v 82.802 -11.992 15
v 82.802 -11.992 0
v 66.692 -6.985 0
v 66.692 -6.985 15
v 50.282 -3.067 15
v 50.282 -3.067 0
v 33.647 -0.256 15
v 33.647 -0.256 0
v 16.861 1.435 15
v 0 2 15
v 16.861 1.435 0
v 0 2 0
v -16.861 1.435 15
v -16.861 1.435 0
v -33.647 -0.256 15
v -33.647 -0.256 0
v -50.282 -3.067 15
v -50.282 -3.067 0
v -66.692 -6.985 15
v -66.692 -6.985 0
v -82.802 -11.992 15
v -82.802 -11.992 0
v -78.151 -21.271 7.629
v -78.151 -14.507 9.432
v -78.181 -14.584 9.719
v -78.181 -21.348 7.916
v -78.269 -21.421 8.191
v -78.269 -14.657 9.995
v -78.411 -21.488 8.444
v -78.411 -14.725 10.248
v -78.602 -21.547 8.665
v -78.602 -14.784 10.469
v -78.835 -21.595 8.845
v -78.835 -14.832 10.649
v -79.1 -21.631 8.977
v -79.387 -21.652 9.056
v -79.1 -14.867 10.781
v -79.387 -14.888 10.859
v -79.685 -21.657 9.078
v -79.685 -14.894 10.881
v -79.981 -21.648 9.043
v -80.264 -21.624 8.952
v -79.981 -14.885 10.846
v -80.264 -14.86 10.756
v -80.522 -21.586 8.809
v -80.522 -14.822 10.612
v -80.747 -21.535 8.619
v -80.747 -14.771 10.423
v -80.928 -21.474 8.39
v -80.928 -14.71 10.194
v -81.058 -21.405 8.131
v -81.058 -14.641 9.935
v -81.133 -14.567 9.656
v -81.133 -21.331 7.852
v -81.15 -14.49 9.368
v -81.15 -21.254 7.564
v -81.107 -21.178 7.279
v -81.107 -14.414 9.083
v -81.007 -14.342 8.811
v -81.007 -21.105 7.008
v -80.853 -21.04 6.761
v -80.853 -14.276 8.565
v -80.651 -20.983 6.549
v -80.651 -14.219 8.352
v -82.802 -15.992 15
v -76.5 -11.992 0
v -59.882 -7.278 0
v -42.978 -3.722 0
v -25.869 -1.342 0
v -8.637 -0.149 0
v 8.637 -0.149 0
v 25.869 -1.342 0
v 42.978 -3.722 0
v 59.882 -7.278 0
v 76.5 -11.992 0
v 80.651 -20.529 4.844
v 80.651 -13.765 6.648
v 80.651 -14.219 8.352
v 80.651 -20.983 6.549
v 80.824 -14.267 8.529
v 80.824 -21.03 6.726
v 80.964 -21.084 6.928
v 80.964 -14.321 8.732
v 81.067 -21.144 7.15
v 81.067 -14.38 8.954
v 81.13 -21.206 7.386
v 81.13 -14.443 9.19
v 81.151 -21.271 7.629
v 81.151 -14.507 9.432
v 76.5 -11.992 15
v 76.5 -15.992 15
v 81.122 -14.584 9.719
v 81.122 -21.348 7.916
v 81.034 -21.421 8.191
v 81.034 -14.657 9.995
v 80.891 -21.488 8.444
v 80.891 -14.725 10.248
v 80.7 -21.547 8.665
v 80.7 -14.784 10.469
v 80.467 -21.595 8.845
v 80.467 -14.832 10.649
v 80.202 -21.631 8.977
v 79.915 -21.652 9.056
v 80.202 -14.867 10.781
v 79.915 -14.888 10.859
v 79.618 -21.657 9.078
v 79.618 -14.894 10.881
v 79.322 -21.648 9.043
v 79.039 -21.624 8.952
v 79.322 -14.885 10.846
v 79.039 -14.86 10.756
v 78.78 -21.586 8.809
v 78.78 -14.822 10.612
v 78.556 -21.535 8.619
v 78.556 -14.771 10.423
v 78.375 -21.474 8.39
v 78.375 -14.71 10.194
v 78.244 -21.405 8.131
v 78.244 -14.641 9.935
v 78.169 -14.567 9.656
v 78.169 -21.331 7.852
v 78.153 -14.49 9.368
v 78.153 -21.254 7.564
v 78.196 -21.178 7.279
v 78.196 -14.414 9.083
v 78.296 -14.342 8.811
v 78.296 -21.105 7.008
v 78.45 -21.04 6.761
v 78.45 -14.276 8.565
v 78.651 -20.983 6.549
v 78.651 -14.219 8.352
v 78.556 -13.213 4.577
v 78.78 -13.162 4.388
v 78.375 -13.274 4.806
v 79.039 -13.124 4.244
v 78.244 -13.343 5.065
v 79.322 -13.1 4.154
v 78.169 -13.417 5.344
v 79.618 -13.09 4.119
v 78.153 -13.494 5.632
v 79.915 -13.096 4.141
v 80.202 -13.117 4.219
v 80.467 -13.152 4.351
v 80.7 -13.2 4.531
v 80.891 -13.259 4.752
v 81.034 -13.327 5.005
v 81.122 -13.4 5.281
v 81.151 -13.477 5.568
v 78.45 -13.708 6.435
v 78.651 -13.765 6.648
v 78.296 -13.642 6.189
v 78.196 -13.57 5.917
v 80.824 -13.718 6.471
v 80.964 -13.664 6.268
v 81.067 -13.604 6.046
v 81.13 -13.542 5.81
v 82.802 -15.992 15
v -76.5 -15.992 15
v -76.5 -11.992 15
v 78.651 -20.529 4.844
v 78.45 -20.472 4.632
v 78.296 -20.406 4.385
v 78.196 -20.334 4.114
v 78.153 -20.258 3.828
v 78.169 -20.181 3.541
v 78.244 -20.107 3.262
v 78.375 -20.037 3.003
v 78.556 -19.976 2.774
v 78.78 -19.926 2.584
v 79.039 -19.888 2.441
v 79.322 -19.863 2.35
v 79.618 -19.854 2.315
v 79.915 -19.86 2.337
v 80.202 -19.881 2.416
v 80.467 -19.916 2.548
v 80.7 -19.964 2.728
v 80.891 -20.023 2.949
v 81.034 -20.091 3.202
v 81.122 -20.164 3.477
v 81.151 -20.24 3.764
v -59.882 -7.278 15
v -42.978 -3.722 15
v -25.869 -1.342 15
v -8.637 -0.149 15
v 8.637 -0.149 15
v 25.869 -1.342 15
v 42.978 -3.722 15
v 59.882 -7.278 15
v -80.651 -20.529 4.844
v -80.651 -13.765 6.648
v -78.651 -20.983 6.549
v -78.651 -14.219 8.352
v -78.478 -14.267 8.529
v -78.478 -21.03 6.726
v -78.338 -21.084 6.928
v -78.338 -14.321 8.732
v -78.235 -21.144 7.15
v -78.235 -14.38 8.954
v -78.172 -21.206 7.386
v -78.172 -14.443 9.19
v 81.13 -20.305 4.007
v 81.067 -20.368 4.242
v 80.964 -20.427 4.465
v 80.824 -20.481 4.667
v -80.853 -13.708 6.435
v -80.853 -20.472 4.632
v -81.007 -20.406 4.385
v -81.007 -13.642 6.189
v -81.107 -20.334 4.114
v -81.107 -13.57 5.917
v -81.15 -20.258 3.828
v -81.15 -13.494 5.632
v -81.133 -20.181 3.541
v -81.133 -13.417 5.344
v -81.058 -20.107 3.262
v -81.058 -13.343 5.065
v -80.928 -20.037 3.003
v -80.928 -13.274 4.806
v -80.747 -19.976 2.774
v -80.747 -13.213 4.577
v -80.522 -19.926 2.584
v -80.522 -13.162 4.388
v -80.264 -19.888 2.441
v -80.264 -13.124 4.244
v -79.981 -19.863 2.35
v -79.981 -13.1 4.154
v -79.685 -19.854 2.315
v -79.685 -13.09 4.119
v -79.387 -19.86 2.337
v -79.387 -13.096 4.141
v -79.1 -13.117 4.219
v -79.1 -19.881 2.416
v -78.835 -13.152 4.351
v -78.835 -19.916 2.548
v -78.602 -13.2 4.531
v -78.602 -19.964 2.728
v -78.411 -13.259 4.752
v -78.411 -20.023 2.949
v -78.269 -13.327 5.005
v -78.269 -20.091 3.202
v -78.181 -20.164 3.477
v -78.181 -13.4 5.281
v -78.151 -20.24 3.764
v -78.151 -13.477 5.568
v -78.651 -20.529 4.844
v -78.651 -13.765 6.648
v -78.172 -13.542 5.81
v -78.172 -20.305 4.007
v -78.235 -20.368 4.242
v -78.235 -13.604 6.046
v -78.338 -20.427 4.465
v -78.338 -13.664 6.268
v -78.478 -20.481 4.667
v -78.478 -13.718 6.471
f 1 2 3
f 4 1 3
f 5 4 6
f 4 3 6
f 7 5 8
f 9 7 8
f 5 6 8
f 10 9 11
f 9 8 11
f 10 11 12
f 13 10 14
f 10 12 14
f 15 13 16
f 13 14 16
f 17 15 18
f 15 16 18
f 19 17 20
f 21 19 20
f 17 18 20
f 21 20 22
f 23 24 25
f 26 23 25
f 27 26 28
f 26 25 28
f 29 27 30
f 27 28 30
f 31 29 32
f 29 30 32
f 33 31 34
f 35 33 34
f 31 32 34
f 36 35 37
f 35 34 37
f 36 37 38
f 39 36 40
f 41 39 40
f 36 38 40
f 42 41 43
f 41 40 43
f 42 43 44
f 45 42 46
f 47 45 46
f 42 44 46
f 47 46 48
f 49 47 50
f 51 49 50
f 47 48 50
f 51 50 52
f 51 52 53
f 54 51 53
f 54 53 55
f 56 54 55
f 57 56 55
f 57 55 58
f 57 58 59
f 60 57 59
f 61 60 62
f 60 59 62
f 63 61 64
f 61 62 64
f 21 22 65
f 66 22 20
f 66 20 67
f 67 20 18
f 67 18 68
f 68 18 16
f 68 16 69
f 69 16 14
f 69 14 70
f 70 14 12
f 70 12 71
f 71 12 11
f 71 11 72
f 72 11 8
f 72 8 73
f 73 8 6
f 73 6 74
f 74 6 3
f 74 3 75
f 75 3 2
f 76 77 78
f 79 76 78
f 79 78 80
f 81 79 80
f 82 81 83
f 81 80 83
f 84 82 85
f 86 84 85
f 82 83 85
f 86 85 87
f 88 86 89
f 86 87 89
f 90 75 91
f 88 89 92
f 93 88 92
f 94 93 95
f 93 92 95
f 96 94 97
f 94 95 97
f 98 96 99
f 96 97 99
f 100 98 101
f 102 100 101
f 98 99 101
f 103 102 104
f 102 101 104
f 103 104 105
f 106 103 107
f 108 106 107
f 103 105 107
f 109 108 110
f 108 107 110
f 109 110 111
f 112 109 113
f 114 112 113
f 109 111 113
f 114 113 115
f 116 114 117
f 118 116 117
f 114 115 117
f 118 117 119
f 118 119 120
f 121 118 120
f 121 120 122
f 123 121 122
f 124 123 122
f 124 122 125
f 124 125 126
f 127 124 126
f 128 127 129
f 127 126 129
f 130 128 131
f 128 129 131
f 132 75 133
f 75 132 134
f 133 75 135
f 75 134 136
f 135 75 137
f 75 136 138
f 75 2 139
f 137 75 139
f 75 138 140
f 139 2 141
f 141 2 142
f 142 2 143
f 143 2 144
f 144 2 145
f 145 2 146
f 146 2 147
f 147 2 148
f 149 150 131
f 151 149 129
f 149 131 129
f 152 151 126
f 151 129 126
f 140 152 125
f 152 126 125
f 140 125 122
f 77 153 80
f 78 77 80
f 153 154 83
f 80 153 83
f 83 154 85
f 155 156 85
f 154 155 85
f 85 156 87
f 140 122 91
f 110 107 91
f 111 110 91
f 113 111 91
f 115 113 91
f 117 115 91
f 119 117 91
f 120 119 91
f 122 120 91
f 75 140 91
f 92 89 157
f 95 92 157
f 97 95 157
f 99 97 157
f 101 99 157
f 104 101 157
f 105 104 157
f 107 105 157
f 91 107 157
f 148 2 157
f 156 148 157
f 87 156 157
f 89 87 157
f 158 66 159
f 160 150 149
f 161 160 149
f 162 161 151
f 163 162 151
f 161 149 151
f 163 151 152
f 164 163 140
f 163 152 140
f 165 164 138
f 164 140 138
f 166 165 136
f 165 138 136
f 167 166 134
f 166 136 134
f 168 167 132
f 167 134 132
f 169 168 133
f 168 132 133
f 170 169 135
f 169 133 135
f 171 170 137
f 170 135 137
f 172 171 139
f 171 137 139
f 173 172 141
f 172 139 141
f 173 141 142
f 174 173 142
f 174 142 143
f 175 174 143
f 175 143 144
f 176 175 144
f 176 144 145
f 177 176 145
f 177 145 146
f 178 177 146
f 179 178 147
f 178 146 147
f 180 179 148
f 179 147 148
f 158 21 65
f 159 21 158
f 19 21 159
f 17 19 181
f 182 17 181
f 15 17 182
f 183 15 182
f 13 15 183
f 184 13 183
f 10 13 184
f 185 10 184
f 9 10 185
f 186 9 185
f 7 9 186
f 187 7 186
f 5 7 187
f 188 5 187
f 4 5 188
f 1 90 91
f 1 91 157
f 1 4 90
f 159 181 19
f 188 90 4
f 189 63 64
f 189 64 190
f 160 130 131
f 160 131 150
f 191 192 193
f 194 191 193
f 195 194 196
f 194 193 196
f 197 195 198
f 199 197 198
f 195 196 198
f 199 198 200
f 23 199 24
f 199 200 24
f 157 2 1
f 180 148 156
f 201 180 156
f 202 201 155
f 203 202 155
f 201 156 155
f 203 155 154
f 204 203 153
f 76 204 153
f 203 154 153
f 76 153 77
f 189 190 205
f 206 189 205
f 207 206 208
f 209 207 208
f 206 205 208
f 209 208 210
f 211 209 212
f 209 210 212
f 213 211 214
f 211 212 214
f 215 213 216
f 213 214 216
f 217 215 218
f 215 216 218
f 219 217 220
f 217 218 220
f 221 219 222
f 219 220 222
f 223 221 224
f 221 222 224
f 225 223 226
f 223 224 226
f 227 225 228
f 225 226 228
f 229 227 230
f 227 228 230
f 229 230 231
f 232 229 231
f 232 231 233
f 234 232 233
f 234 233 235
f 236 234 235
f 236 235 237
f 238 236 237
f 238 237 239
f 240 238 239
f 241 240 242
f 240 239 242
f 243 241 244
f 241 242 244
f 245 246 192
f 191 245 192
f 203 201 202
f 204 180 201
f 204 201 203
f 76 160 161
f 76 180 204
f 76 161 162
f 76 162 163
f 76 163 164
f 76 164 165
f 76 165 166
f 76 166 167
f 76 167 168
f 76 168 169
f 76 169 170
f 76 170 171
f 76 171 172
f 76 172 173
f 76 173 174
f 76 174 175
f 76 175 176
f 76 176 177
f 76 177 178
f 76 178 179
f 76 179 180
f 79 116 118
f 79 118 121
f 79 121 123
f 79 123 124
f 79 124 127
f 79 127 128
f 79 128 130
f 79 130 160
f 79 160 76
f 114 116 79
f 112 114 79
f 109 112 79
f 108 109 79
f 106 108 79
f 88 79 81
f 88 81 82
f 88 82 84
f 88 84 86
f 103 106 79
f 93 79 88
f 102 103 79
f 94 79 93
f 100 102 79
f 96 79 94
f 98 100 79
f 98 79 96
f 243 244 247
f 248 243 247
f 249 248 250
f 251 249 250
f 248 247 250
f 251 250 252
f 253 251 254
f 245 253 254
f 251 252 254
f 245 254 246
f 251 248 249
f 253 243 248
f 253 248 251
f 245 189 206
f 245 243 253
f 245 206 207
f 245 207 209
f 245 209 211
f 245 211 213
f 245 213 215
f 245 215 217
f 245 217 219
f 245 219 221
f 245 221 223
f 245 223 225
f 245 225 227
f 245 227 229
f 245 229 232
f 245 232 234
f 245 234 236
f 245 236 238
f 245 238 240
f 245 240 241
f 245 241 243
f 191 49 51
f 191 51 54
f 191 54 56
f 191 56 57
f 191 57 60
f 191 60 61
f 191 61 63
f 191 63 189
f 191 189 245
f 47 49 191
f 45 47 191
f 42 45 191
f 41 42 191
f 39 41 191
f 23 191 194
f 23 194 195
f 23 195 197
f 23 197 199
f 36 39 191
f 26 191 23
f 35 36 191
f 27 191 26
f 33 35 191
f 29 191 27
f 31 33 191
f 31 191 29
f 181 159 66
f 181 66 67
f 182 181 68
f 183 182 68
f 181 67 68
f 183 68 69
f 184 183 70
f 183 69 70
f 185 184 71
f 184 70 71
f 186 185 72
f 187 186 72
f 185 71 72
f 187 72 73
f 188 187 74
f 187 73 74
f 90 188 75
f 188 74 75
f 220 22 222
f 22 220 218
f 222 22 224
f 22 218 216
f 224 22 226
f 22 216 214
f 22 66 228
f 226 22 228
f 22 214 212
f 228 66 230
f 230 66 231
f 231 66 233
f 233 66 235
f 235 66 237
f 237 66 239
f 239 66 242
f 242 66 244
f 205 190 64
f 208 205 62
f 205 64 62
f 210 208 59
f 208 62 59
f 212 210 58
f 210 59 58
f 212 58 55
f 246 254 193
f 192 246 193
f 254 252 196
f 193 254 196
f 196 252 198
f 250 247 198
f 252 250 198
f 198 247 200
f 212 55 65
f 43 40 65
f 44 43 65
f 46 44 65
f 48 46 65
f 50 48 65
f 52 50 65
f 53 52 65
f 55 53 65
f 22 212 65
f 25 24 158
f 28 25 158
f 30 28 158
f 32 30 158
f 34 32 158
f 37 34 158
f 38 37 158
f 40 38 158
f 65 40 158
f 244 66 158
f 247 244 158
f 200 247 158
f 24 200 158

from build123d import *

# Parameters (mm, degrees)
F1_DEPTH = 15
F2_DEPTH = 4
F4_DEPTH = 250
F6_DEPTH = 7


with BuildPart() as f1:
    # F0 (on Top) → F1 (new body)
    with BuildSketch(Plane.XY):
        with BuildLine():
            ThreePointArc((-76.5, -11.9921219791), (0, 0), (76.5, -11.9921219791))
            Line((76.5, -11.9921219791), (82.8024758084, -11.9921219791))
            ThreePointArc((82.8024758084, -11.9921219791), (0, 2), (-82.8024758084, -11.9921219791))
            Line((-82.8024758084, -11.9921219791), (-76.5, -11.9921219791))
        make_face()
    extrude(amount=F1_DEPTH)

    # F2 (add): faces of the model
    f2_faces = [f1.faces().sort_by_distance(p)[0] for p in [
        (-79.6512379042, -11.9921219791, 7.5),
        (79.6512379042, -11.9921219791, 7.5),
    ]]
    extrude(f2_faces, amount=F2_DEPTH)

    # F3 (on face) → F4 (cut)
    with BuildSketch(Plane.YZ.offset(82.8024758084)):
        Polygon((-11.9921219791, 0), (-15.9921219791, 15), (-15.9921219791, 0), align=None)
    extrude(amount=-F4_DEPTH, mode=Mode.SUBTRACT)

    # F5 (on face) → F6 (join)
    with BuildSketch(Plane(origin=(0, -11.1959645033, -2.9855905342), x_dir=(1, 0, 0), z_dir=(0, -0.9662349396, -0.2576626506))):
        with BuildLine():
            ThreePointArc((-80.6512379042, 9.9700432719), (-80.2636103399, 7.4827028894), (-78.1512379042, 8.8520092831))
            ThreePointArc((-78.1512379042, 8.8520092831), (-78.2819315104, 9.4643817188), (-78.6512379042, 9.9700432719))
            ThreePointArc((-78.6512379042, 9.9700432719), (-79.6512379042, 10.3520092831), (-80.6512379042, 9.9700432719))
        make_face()
        with BuildLine():
            ThreePointArc((-80.6512379042, 9.9700432719), (-79.6512379042, 10.3520092831), (-78.6512379042, 9.9700432719))
            Line((-78.6512379042, 9.9700432719), (-78.6512379042, 11.7339752944))
            ThreePointArc((-78.6512379042, 11.7339752944), (-79.6512379042, 11.3520092831), (-80.6512379042, 11.7339752944))
            Line((-80.6512379042, 11.7339752944), (-80.6512379042, 9.9700432719))
        make_face()
        with BuildLine():
            ThreePointArc((-80.6512379042, 11.7339752944), (-79.6512379042, 11.3520092831), (-78.6512379042, 11.7339752944))
            ThreePointArc((-78.6512379042, 11.7339752944), (-78.2819315104, 12.2396368474), (-78.1512379042, 12.8520092831))
            ThreePointArc((-78.1512379042, 12.8520092831), (-80.2636103399, 14.2213156769), (-80.6512379042, 11.7339752944))
        make_face()
        with BuildLine():
            ThreePointArc((80.6512379042, 9.9700432719), (79.6512379042, 10.3520092831), (78.6512379042, 9.9700432719))
            ThreePointArc((78.6512379042, 9.9700432719), (79.0388654685, 7.4827028894), (81.1512379042, 8.8520092831))
            ThreePointArc((81.1512379042, 8.8520092831), (81.020544298, 9.4643817188), (80.6512379042, 9.9700432719))
        make_face()
        with BuildLine():
            Line((78.6512379042, 11.7339752944), (78.6512379042, 9.9700432719))
            ThreePointArc((78.6512379042, 9.9700432719), (79.6512379042, 10.3520092831), (80.6512379042, 9.9700432719))
            Line((80.6512379042, 9.9700432719), (80.6512379042, 11.7339752944))
            ThreePointArc((80.6512379042, 11.7339752944), (79.6512379042, 11.3520092831), (78.6512379042, 11.7339752944))
        make_face()
        with BuildLine():
            ThreePointArc((81.1512379042, 12.8520092831), (79.0388654685, 14.2213156769), (78.6512379042, 11.7339752944))
            ThreePointArc((78.6512379042, 11.7339752944), (79.6512379042, 11.3520092831), (80.6512379042, 11.7339752944))
            ThreePointArc((80.6512379042, 11.7339752944), (81.020544298, 12.2396368474), (81.1512379042, 12.8520092831))
        make_face()
    extrude(amount=F6_DEPTH)


solid = f1.part
